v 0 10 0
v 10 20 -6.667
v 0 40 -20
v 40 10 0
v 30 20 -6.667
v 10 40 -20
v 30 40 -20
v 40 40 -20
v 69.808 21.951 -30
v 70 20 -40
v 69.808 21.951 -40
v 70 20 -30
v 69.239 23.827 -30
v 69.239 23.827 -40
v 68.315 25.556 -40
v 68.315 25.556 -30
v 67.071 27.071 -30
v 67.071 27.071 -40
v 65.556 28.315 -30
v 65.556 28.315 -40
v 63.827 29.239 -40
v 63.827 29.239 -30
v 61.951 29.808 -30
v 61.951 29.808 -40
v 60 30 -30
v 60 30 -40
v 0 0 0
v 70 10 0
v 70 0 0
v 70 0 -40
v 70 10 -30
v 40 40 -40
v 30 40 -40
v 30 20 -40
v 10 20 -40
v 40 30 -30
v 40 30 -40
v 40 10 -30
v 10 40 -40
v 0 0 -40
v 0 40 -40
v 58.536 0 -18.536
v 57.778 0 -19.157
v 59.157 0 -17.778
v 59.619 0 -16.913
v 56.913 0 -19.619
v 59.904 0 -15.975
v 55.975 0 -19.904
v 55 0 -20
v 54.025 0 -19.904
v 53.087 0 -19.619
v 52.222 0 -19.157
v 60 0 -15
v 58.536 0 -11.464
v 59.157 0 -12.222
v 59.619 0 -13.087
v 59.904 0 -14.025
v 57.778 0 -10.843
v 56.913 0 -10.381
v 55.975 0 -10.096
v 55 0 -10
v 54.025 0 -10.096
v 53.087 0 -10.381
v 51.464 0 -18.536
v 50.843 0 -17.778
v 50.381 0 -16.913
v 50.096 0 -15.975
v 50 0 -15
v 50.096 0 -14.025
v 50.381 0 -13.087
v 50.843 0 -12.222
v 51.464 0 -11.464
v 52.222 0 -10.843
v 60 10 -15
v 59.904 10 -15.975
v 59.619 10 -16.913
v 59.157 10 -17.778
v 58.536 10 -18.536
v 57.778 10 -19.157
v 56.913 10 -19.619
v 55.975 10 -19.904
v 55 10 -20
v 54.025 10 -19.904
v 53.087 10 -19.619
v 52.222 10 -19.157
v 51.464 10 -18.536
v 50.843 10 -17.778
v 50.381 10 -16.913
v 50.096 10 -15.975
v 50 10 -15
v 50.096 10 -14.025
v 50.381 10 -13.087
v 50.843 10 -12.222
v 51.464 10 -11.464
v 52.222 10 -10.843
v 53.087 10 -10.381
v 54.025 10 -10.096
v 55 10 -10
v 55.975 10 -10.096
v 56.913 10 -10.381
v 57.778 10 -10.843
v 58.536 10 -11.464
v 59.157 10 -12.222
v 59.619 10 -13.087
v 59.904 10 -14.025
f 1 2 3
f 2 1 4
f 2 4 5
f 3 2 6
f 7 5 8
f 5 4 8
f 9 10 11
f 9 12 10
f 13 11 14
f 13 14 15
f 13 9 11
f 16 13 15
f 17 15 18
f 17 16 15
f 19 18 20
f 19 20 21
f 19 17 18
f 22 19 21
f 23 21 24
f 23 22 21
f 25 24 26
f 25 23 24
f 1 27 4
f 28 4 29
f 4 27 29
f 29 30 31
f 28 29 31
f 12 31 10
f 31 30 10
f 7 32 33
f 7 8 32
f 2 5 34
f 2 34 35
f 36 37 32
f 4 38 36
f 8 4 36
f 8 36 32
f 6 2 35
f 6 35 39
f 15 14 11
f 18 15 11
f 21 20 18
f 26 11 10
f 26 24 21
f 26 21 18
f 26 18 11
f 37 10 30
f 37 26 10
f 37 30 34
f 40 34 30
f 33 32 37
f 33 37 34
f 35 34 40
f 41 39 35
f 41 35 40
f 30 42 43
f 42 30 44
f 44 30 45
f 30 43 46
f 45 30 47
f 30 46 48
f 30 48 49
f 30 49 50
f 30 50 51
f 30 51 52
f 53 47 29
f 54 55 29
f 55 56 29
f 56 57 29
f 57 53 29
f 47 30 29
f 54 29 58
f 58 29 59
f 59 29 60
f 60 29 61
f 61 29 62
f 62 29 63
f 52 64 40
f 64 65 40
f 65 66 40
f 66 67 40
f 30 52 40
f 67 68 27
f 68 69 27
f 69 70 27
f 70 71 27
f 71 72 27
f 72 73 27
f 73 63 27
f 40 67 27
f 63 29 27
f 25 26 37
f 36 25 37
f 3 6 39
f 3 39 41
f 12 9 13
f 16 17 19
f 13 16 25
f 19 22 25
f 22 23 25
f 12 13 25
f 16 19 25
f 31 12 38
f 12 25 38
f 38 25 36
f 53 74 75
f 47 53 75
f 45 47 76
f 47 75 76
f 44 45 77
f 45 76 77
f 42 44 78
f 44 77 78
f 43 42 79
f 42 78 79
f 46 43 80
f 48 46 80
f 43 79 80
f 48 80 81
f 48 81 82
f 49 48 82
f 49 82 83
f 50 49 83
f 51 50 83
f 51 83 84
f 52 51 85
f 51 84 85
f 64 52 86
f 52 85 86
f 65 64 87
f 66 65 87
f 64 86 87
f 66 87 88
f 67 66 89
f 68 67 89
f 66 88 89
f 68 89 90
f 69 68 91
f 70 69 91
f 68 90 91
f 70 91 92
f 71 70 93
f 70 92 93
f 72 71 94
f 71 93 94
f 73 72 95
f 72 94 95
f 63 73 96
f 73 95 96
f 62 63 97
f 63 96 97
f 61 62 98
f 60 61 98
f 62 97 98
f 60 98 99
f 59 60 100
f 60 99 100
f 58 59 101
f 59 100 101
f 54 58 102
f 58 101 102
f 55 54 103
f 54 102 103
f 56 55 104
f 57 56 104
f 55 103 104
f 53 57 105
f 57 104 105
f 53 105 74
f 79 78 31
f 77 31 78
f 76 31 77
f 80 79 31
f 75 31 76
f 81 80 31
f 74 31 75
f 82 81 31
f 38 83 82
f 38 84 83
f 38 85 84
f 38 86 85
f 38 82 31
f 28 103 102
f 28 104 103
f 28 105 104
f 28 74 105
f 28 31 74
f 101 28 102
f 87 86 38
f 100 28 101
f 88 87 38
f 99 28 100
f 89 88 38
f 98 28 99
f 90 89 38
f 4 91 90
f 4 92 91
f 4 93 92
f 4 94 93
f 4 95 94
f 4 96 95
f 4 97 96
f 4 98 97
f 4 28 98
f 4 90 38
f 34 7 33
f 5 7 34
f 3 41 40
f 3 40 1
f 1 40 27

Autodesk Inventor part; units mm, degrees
ref_plane "YZ Plane" through (0, 0, 0) normal (1, 0, 0) x (0, 1, 0)
ref_plane "XZ Plane" through (0, 0, 0) normal (0, 1, 0) x (-1, 0, 0)
ref_plane "XY Plane" through (0, 0, 0) normal (0, 0, 1) x (1, 0, 0)
sketch "草圖1" plane through (0, 0, 0) normal (0, 1, 0) x (-1, 0, 0)
  line L0 (0, 0) -> (-70, 0)
  line L1 (-70, 0) -> (-70, -40)
  line L2 (-70, -40) -> (0, -40)
  line L3 (0, -40) -> (0, 0)
  dimension "d0" = 40
  dimension "d1" = 70
extrude "擠出1" add sketch "草圖1" along normal blind 10
sketch "草圖2" plane through (0, 0, 0) normal (0, 0, 1) x (1, 0, 0)
  line L0 (0, 0) -> (0, 10) projected
  line L1 (0, 10) -> (10, 10)
  line L2 (10, 10) -> (10, 40)
  line L3 (10, 40) -> (0, 40)
  line L4 (0, 40) -> (0, 10)
  line L5 (10, 10) -> (30, 10)
  line L6 (30, 10) -> (30, 20)
  line L7 (30, 20) -> (10, 20)
  line L8 (10, 20) -> (10, 10)
  line L9 (30, 10) -> (40, 10)
  line L10 (40, 10) -> (40, 40)
  line L11 (40, 40) -> (30, 40)
  line L12 (30, 40) -> (30, 10)
  dimension "d4" = 20
  dimension "d5" = 10
  dimension "d6" = 10
  dimension "d7" = 10
  dimension "d8" = 30
extrude "擠出2" add sketch "草圖2" against normal blind 40
sketch "草圖3" plane through (70, 0, -40) normal (0, 0, -1) x (-1, 0, 0)
  line L0 (30, 10) -> (30, 40) projected
  line L1 (30, 10) -> (0, 10)
  line L2 (0, 10) -> (0, 30)
  line L3 (0, 30) -> (30, 30)
  line L4 (30, 30) -> (30, 10)
  point P0 (70, 0)
  dimension "d11" = 20
  dimension "d12" = 30
extrude "擠出3" add sketch "草圖3" against normal blind 10
fillet "圓角1" radius 10 1 edges at (70, 30, -35)
sketch "草圖4" plane through (40, 10, 0) normal (1, 0, 0) x (0, 0, -1)
  line L0 (0, 0) -> (0, 30) projected
  line L1 (0, 0) -> (20, 30)
  line L2 (20, 30) -> (0, 30)
  point P0 (0, -10)
  dimension "d16" = 20
  dimension "d17" = 30
extrude "擠出4" cut sketch "草圖4" against normal through all
sketch "草圖5" plane through (0, 10, 0) normal (0, 1, 0) x (1, 0, 0)
  circle A0 centre (55, 15) radius 5
  line L0 (70, 0) -> (70, 30) projected
  line L1 (40, 0) -> (70, 0) projected
  point P0 (0, 0)
  dimension "d20" = 15
  dimension "d21" = 15
  dimension "d22" = 10
extrude "擠出5" cut sketch "草圖5" against normal blind 10
properties part number "31"
